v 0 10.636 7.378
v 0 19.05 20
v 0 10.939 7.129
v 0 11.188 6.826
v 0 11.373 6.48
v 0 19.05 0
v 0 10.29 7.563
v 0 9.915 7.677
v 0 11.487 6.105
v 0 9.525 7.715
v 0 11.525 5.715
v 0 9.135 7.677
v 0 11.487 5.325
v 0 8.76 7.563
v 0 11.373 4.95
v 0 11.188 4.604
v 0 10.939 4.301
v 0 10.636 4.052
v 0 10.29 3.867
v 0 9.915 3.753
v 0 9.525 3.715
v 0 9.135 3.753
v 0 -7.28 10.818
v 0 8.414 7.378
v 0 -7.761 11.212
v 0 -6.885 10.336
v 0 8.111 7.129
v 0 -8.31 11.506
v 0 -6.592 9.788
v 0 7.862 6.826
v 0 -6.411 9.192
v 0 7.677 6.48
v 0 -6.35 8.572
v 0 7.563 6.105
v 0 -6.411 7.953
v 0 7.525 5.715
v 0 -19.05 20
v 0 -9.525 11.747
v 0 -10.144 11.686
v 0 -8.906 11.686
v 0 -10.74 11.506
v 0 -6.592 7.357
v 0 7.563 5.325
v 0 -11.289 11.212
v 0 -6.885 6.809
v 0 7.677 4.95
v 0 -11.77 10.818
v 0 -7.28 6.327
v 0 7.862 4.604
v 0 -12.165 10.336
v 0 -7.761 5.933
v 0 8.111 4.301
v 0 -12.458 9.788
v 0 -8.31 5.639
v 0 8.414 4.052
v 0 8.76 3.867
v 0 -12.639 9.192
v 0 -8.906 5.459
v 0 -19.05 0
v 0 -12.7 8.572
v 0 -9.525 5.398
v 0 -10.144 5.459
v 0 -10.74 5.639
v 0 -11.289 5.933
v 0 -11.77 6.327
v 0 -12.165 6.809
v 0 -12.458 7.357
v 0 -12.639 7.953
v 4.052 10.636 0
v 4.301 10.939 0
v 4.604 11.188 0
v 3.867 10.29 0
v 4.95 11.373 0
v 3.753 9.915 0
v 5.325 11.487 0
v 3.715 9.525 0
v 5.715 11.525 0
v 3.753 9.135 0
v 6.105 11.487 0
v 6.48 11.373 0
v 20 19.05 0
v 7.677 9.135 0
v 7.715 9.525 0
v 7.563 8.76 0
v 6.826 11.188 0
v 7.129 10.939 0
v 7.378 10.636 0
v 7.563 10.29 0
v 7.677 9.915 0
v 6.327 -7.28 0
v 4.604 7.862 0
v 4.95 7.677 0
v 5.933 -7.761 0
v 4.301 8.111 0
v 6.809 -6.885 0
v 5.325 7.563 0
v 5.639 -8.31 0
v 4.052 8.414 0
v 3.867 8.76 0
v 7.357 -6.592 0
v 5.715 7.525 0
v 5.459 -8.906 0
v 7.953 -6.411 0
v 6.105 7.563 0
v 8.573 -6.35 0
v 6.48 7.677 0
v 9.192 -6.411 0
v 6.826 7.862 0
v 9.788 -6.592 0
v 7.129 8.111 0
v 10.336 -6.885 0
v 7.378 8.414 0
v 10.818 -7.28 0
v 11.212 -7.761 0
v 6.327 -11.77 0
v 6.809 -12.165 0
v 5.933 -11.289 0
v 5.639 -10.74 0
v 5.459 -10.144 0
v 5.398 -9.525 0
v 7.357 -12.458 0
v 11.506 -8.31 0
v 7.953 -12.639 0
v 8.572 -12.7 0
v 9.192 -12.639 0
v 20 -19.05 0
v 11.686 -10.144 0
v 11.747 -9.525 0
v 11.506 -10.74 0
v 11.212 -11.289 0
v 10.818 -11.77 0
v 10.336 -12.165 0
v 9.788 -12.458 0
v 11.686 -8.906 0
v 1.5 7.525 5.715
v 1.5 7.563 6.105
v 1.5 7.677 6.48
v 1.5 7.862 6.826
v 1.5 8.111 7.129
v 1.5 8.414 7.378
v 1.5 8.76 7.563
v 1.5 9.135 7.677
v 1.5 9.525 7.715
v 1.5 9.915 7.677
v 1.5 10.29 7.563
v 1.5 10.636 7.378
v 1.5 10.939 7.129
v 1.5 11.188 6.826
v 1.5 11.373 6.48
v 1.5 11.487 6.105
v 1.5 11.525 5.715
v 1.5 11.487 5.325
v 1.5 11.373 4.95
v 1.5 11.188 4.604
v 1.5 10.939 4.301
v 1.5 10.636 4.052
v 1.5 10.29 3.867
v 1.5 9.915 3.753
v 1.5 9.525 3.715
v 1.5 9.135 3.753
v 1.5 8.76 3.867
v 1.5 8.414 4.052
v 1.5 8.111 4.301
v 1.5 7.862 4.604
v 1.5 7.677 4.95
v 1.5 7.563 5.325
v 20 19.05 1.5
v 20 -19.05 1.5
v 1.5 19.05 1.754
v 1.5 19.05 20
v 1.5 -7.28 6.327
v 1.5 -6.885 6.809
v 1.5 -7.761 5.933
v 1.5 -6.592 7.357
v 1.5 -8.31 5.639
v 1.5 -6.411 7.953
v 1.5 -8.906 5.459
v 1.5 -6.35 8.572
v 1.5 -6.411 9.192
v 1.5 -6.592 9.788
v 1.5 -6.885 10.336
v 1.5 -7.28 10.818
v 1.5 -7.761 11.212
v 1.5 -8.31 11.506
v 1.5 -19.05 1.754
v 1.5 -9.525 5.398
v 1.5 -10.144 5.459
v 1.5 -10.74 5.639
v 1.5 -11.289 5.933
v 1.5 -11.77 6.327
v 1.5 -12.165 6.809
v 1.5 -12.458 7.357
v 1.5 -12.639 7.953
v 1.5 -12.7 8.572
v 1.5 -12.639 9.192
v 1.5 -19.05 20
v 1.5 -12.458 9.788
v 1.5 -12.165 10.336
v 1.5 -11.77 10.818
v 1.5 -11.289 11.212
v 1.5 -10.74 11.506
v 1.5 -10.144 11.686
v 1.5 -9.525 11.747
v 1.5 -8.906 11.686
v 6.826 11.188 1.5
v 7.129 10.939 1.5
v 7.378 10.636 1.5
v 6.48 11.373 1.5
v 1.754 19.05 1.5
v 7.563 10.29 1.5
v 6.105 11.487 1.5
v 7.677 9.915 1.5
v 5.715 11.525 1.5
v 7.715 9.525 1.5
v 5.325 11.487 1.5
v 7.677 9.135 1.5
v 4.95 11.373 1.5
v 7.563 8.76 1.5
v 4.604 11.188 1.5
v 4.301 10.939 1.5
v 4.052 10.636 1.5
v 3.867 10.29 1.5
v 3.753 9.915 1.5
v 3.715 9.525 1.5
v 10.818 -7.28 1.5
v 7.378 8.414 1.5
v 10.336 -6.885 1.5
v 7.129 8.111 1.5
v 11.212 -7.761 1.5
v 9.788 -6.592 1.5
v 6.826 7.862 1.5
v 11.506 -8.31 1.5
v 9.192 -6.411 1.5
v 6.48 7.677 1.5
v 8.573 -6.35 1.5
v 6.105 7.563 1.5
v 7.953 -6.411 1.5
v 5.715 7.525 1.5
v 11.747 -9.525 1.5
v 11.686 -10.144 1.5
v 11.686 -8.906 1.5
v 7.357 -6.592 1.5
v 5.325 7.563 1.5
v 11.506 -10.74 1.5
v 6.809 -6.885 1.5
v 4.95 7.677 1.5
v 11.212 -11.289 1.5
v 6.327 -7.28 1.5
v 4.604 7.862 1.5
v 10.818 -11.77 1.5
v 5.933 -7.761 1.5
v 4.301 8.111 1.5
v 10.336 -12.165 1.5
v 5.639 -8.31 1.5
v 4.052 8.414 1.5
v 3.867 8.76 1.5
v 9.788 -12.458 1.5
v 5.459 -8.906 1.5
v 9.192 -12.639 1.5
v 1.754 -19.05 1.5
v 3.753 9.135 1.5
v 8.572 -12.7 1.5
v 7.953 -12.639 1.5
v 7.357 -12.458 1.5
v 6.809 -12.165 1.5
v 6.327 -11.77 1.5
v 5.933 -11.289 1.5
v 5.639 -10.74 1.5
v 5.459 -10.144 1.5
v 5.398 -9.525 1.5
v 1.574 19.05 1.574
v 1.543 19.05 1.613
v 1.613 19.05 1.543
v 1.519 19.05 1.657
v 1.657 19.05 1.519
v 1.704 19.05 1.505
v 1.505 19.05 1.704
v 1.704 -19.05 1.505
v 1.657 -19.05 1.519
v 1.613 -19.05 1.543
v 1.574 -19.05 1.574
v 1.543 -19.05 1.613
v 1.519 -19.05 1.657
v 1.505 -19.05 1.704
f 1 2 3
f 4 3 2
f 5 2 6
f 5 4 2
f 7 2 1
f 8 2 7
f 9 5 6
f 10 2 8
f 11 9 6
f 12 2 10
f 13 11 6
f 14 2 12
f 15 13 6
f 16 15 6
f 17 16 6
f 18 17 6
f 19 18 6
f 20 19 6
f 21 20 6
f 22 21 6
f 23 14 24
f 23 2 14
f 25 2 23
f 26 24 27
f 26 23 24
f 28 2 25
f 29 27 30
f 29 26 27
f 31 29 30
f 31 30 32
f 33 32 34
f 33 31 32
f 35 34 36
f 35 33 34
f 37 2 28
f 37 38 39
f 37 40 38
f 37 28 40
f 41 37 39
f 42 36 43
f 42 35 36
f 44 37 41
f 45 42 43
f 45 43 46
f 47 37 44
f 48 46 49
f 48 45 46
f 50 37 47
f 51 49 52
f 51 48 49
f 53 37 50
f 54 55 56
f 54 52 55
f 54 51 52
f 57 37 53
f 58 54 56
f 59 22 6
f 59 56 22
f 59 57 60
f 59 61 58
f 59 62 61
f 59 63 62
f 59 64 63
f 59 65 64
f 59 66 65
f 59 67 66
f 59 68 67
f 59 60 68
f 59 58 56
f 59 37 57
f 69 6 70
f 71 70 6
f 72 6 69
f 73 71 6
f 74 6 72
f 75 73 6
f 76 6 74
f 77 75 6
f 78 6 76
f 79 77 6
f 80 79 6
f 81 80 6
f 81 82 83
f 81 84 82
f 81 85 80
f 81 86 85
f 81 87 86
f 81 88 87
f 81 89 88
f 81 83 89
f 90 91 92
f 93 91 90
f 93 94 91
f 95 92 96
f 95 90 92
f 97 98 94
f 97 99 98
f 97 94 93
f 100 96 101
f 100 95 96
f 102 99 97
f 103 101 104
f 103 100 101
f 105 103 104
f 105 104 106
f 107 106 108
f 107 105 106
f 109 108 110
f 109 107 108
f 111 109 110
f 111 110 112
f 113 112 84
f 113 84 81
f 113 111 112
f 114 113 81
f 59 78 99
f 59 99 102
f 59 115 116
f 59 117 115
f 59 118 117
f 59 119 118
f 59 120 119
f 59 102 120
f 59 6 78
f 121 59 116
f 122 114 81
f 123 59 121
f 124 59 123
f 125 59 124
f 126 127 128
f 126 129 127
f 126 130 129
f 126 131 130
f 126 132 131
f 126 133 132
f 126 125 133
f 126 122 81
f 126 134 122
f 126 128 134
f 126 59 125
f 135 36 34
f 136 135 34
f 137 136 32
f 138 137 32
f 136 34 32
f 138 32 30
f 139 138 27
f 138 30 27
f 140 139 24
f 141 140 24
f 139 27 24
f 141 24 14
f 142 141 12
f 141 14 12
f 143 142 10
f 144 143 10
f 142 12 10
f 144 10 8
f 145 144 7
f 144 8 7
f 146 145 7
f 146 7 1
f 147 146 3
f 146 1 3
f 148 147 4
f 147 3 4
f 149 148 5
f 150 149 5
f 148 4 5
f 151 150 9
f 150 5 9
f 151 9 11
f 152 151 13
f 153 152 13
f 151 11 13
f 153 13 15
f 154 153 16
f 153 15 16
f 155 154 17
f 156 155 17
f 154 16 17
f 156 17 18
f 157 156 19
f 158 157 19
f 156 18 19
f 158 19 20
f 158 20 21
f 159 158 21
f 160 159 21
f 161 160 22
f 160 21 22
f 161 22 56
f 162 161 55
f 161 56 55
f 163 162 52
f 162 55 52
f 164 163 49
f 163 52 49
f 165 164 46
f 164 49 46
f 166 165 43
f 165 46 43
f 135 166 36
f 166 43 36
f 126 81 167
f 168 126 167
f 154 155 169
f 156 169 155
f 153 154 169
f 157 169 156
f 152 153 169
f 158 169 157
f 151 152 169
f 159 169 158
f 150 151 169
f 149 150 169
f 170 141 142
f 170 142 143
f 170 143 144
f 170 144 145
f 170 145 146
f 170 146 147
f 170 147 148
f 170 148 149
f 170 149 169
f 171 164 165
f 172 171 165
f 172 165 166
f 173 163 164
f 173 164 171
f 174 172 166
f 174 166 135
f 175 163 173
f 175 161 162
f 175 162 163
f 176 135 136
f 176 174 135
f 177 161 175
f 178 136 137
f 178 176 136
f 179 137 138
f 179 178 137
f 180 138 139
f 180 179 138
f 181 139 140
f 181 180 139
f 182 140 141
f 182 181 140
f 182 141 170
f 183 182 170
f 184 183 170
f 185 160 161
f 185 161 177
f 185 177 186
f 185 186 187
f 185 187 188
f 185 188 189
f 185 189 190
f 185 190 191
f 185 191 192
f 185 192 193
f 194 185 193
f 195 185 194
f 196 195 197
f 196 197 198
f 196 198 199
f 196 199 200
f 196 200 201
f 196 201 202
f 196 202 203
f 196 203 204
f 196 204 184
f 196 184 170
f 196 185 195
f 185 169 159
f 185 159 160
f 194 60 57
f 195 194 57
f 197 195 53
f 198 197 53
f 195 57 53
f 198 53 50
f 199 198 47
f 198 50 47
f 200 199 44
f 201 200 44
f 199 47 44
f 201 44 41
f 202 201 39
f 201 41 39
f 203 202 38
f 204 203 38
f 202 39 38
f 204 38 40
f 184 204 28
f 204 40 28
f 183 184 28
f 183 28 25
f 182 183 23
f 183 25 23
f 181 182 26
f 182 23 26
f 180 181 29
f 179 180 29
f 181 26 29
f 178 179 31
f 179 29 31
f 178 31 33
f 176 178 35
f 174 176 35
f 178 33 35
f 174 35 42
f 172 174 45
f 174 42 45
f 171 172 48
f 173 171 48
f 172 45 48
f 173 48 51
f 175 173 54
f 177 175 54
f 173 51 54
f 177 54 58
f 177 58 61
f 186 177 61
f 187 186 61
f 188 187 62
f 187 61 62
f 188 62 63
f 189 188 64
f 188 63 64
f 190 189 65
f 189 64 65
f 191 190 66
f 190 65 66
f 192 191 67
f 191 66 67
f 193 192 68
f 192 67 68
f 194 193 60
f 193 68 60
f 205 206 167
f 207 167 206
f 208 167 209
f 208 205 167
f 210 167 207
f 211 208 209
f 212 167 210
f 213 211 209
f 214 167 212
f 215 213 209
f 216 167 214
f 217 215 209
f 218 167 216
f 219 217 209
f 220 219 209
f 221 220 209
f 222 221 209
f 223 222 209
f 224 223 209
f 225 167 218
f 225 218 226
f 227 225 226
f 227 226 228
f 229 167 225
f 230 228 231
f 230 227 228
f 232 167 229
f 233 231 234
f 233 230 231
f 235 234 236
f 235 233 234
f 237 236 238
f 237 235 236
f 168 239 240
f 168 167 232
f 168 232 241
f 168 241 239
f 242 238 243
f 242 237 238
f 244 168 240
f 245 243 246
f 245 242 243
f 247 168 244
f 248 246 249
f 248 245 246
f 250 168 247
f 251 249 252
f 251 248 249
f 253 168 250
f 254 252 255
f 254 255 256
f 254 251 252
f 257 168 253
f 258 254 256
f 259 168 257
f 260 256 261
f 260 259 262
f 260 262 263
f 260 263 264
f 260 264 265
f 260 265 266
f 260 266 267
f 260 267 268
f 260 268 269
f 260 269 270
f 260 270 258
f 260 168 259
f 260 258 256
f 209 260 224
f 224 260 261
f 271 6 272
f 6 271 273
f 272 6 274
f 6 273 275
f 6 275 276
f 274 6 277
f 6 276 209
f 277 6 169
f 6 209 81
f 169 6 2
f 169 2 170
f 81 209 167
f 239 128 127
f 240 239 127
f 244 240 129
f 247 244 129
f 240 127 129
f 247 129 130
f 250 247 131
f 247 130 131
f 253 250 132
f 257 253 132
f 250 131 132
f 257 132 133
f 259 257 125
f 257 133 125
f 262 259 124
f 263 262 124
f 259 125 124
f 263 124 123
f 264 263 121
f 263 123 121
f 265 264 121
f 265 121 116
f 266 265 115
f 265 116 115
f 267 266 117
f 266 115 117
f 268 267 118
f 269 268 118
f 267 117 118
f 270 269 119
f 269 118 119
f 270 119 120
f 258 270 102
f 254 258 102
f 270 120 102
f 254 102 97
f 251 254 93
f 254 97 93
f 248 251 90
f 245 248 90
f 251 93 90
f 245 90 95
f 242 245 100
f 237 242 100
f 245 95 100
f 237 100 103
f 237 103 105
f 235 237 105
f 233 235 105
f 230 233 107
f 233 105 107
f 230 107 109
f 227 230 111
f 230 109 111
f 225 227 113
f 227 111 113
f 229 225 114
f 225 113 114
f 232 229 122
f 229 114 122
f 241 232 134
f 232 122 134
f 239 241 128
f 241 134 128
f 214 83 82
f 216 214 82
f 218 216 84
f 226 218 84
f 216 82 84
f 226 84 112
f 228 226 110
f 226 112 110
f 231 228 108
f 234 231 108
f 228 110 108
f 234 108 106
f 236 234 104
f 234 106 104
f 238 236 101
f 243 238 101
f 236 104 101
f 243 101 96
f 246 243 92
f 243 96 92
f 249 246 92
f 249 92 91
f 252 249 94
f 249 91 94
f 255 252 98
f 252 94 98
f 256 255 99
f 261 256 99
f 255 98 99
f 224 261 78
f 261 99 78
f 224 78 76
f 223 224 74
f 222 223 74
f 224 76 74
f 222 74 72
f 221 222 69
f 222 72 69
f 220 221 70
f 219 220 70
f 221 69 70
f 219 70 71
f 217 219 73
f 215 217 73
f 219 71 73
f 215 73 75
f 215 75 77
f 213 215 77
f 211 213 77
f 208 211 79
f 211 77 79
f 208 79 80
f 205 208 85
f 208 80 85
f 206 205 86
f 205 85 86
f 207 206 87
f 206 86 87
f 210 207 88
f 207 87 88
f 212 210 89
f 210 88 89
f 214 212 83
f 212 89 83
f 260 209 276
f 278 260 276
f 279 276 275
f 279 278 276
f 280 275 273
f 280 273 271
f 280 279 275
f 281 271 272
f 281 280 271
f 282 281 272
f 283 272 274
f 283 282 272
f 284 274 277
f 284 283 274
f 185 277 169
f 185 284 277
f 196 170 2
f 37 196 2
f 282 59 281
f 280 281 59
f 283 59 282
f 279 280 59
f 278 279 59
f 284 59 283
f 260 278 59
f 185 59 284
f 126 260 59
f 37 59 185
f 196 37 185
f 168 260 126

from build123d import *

# Parameters (mm, degrees)
F1_DEPTH = 19.05
F2_R     = 3.175
F2_R_2   = 2
F3_DEPTH = 1.5
F4_R     = 3.175
F4_R_2   = 2
F5_DEPTH = 1.5


with BuildPart() as f1:
    # F0 (on Front) → F1 (new body, symmetric)
    with BuildSketch(Plane.XZ):
        with BuildLine():
            Line((1.5, 20), (0, 20))
            Line((0, 20), (0, 0))
            Line((0, 0), (20, 0))
            Line((20, 0), (20, 1.5))
            Line((20, 1.5), (1.754, 1.5))
            ThreePointArc((1.754, 1.5), (1.574395, 1.574395), (1.5, 1.754))
            Line((1.5, 1.754), (1.5, 20))
        make_face()
    extrude(amount=F1_DEPTH, both=True)

    # F2 (on face) → F3 (cut, through all)
    with BuildSketch(Plane(origin=(0, 0, 0), x_dir=(0, -1, 0), z_dir=(-1, 0, 0))):
        with Locations((9.525, 8.5725)):
            Circle(F2_R)
        with Locations((-9.525, 5.715)):
            Circle(F2_R_2)
    extrude(amount=-F3_DEPTH, mode=Mode.SUBTRACT)

    # F4 (on face) → F5 (cut, through all)
    with BuildSketch(Plane(origin=(0, 0, 0), x_dir=(1, 0, 0), z_dir=(0, 0, -1))):
        with Locations((8.5725, 9.525)):
            Circle(F4_R)
        with Locations((5.715, -9.525)):
            Circle(F4_R_2)
    extrude(amount=-F5_DEPTH, mode=Mode.SUBTRACT)


solid = f1.part
